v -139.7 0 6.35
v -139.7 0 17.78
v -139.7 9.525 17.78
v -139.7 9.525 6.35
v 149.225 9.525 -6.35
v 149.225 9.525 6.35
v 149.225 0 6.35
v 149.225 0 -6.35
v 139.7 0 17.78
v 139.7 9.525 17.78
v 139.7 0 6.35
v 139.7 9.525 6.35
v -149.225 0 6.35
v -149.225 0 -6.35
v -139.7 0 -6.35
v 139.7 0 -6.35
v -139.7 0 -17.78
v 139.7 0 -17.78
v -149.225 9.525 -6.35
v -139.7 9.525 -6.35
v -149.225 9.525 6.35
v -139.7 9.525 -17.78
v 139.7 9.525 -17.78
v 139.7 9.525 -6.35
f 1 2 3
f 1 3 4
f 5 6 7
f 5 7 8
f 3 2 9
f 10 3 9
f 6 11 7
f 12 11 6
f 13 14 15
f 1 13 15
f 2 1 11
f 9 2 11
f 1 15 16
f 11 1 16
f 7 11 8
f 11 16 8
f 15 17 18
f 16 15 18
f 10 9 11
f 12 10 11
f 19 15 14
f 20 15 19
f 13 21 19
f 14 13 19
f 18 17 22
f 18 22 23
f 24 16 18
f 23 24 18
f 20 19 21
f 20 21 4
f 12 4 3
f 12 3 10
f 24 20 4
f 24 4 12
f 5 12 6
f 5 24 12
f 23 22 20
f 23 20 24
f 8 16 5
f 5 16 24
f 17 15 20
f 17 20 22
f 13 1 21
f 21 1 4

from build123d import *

# Parameters (mm, degrees)
SKETCH1_W           = 279.4
SKETCH1_H           = 35.56
BOSS_EXTRUDE1_DEPTH = 9.525
SKETCH2_W           = 12.7
SKETCH2_H           = 9.525
BOSS_EXTRUDE2_DEPTH = 9.525


with BuildPart() as part:
    # Sketch1 → Boss-Extrude1 (new body)
    with BuildSketch(Plane(origin=(0, 0, 0), x_dir=(1, 0, 0), z_dir=(0, 1, 0))):
        Rectangle(SKETCH1_W, SKETCH1_H)
    extrude(amount=BOSS_EXTRUDE1_DEPTH)

    # Sketch2 → Boss-Extrude2 (add)
    with BuildSketch(Plane(origin=(139.7, 0, 0), x_dir=(0, 0, -1), z_dir=(1, 0, 0))):
        with Locations((0, 4.7625)):
            Rectangle(SKETCH2_W, SKETCH2_H)
    boss_extrude2 = extrude(amount=BOSS_EXTRUDE2_DEPTH)

    # Mirror1: Boss-Extrude2 across plane
    add(boss_extrude2.mirror(Plane(origin=(0, 0, 0), x_dir=(0, 0, 1), z_dir=(1, 0, 0))))


solid = part.part
